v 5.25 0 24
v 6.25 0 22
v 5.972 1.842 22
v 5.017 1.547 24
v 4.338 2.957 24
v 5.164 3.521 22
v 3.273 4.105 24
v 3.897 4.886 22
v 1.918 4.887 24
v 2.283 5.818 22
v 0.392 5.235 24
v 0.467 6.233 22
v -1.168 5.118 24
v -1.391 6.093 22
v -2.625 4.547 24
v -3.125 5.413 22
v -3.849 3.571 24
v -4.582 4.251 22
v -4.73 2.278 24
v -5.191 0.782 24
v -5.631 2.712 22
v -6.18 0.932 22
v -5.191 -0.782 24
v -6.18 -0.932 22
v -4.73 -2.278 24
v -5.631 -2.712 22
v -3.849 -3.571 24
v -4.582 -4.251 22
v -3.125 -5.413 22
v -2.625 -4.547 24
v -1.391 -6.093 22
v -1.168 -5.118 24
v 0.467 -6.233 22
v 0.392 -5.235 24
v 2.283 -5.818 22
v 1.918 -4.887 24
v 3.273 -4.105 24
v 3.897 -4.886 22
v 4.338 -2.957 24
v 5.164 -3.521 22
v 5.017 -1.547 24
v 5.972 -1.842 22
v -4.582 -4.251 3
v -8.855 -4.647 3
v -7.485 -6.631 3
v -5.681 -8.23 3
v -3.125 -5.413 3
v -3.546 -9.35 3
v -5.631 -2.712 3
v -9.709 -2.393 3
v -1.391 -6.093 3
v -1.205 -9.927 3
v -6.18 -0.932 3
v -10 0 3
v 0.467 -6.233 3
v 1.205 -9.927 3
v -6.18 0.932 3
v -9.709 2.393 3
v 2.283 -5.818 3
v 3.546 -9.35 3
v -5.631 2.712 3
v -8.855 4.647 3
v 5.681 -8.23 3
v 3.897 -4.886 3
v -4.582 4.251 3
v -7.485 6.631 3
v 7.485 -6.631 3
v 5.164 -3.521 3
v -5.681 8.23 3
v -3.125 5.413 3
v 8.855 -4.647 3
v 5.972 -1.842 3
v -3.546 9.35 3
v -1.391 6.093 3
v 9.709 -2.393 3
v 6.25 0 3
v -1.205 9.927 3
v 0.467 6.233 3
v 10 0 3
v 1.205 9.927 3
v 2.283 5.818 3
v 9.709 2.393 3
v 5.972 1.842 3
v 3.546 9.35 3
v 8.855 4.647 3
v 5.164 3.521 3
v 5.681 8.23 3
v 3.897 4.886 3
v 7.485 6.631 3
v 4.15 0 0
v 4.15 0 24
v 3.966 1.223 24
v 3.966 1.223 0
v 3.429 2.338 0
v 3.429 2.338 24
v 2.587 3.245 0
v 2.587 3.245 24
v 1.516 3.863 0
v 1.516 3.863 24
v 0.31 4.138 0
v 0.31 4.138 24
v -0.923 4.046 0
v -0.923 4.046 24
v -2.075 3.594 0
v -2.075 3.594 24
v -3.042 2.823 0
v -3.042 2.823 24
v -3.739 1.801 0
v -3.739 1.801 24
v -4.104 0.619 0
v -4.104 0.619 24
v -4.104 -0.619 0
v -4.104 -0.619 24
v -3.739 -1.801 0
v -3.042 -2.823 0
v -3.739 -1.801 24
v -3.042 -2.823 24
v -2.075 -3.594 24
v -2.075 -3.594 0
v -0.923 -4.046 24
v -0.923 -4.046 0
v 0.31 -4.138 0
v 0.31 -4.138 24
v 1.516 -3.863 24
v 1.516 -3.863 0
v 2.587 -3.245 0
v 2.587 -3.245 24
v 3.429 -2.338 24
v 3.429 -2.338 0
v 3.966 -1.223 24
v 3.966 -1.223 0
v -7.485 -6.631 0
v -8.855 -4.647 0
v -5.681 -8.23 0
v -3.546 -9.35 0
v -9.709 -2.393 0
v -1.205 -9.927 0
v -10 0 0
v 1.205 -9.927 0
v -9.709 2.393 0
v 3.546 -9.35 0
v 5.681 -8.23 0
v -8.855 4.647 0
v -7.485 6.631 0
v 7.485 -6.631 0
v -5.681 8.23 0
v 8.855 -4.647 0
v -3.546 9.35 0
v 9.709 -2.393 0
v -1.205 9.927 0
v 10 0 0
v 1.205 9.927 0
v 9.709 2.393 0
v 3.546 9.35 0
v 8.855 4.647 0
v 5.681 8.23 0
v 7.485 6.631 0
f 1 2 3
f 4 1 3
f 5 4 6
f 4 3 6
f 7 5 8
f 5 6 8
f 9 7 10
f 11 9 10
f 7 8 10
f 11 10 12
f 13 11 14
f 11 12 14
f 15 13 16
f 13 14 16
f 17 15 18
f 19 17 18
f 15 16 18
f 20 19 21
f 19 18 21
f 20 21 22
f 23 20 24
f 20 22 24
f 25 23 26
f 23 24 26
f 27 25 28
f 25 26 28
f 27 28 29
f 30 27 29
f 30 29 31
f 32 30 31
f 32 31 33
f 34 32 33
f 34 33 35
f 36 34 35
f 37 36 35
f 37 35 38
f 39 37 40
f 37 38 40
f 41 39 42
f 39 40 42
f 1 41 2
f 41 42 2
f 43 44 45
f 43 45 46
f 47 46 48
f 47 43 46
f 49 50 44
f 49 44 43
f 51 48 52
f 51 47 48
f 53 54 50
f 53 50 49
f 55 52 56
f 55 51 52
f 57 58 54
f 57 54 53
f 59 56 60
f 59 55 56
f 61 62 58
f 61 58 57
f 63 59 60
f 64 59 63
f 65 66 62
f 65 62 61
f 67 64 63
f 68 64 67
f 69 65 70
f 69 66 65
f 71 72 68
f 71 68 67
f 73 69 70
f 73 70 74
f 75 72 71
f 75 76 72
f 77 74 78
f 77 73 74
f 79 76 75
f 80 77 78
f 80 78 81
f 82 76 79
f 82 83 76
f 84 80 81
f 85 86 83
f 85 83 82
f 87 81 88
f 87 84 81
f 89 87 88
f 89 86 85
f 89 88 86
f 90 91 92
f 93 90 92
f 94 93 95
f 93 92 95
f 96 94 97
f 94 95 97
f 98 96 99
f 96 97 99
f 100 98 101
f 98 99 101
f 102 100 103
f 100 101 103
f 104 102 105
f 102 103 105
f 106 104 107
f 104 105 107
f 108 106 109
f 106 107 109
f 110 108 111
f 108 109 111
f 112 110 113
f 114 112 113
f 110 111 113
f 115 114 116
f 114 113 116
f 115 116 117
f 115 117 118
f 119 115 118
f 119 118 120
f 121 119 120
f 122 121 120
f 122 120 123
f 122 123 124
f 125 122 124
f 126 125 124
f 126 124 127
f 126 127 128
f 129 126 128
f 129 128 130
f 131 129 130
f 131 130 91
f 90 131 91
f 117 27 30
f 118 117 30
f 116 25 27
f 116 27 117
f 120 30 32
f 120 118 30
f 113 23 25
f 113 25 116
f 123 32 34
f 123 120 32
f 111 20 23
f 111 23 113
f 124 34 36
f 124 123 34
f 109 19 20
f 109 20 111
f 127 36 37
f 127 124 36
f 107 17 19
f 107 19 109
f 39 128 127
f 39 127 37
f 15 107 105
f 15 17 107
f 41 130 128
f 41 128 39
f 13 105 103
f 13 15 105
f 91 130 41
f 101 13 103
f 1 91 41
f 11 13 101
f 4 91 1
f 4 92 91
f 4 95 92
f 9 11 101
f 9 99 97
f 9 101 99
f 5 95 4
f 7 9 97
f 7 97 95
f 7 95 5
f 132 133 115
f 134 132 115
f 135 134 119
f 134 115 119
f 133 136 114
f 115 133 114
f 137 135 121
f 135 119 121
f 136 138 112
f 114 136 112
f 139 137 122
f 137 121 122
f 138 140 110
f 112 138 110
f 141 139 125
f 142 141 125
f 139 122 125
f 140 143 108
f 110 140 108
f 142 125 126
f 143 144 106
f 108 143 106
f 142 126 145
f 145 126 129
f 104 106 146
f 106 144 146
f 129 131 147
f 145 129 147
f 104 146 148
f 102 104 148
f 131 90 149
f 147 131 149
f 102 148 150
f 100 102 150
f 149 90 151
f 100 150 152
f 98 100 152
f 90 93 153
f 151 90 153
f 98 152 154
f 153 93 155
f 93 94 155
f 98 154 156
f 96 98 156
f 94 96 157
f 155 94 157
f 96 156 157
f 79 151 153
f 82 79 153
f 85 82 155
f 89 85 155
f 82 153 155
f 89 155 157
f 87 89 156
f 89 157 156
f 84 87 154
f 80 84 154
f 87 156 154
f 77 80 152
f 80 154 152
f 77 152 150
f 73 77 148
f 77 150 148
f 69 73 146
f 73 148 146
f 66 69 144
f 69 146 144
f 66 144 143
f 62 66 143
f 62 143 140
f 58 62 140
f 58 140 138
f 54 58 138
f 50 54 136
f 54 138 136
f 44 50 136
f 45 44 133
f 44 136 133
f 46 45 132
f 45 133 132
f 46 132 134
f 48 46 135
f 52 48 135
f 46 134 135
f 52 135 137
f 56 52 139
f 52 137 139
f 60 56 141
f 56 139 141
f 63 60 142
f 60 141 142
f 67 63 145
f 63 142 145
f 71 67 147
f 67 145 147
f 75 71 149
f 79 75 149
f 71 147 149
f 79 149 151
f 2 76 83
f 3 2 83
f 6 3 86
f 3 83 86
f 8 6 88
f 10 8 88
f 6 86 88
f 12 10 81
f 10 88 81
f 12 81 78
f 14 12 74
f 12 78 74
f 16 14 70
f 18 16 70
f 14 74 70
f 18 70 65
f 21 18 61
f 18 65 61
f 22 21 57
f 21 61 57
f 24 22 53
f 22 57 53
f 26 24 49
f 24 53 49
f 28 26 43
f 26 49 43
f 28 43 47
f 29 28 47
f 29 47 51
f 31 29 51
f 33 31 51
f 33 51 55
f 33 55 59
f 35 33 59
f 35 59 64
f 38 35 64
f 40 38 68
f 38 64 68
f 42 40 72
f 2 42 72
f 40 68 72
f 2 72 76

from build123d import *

# Parameters (mm, degrees)
F0_R     = 10
F1_DEPTH = 3
F2_R     = 6.25
F3_DEPTH = 21
F4_R     = 4.15
F5_DEPTH = 25
F6_SIZE2 = 2
F6_SIZE  = 1


with BuildPart() as f1:
    # F0 (on Top) → F1 (new body)
    with BuildSketch(Plane.XY):
        Circle(F0_R)
    extrude(amount=F1_DEPTH)

    # F2 (on face) → F3 (join)
    with BuildSketch(Plane.XY.offset(3)):
        Circle(F2_R)
    extrude(amount=F3_DEPTH)

    # F4 (on face) → F5 (cut)
    with BuildSketch(Plane.XY.offset(24)):
        Circle(F4_R)
    extrude(amount=-F5_DEPTH, mode=Mode.SUBTRACT)

    # F6
    f6_edges = [f1.edges().sort_by_distance(p)[0] for p in [
        (-6.25, 0, 24),
    ]]
    f6_side = f1.faces().sort_by_distance((-6.073223, 0, 24))[0]
    chamfer(f6_edges, length=F6_SIZE, length2=F6_SIZE2, reference=f6_side)


solid = f1.part
